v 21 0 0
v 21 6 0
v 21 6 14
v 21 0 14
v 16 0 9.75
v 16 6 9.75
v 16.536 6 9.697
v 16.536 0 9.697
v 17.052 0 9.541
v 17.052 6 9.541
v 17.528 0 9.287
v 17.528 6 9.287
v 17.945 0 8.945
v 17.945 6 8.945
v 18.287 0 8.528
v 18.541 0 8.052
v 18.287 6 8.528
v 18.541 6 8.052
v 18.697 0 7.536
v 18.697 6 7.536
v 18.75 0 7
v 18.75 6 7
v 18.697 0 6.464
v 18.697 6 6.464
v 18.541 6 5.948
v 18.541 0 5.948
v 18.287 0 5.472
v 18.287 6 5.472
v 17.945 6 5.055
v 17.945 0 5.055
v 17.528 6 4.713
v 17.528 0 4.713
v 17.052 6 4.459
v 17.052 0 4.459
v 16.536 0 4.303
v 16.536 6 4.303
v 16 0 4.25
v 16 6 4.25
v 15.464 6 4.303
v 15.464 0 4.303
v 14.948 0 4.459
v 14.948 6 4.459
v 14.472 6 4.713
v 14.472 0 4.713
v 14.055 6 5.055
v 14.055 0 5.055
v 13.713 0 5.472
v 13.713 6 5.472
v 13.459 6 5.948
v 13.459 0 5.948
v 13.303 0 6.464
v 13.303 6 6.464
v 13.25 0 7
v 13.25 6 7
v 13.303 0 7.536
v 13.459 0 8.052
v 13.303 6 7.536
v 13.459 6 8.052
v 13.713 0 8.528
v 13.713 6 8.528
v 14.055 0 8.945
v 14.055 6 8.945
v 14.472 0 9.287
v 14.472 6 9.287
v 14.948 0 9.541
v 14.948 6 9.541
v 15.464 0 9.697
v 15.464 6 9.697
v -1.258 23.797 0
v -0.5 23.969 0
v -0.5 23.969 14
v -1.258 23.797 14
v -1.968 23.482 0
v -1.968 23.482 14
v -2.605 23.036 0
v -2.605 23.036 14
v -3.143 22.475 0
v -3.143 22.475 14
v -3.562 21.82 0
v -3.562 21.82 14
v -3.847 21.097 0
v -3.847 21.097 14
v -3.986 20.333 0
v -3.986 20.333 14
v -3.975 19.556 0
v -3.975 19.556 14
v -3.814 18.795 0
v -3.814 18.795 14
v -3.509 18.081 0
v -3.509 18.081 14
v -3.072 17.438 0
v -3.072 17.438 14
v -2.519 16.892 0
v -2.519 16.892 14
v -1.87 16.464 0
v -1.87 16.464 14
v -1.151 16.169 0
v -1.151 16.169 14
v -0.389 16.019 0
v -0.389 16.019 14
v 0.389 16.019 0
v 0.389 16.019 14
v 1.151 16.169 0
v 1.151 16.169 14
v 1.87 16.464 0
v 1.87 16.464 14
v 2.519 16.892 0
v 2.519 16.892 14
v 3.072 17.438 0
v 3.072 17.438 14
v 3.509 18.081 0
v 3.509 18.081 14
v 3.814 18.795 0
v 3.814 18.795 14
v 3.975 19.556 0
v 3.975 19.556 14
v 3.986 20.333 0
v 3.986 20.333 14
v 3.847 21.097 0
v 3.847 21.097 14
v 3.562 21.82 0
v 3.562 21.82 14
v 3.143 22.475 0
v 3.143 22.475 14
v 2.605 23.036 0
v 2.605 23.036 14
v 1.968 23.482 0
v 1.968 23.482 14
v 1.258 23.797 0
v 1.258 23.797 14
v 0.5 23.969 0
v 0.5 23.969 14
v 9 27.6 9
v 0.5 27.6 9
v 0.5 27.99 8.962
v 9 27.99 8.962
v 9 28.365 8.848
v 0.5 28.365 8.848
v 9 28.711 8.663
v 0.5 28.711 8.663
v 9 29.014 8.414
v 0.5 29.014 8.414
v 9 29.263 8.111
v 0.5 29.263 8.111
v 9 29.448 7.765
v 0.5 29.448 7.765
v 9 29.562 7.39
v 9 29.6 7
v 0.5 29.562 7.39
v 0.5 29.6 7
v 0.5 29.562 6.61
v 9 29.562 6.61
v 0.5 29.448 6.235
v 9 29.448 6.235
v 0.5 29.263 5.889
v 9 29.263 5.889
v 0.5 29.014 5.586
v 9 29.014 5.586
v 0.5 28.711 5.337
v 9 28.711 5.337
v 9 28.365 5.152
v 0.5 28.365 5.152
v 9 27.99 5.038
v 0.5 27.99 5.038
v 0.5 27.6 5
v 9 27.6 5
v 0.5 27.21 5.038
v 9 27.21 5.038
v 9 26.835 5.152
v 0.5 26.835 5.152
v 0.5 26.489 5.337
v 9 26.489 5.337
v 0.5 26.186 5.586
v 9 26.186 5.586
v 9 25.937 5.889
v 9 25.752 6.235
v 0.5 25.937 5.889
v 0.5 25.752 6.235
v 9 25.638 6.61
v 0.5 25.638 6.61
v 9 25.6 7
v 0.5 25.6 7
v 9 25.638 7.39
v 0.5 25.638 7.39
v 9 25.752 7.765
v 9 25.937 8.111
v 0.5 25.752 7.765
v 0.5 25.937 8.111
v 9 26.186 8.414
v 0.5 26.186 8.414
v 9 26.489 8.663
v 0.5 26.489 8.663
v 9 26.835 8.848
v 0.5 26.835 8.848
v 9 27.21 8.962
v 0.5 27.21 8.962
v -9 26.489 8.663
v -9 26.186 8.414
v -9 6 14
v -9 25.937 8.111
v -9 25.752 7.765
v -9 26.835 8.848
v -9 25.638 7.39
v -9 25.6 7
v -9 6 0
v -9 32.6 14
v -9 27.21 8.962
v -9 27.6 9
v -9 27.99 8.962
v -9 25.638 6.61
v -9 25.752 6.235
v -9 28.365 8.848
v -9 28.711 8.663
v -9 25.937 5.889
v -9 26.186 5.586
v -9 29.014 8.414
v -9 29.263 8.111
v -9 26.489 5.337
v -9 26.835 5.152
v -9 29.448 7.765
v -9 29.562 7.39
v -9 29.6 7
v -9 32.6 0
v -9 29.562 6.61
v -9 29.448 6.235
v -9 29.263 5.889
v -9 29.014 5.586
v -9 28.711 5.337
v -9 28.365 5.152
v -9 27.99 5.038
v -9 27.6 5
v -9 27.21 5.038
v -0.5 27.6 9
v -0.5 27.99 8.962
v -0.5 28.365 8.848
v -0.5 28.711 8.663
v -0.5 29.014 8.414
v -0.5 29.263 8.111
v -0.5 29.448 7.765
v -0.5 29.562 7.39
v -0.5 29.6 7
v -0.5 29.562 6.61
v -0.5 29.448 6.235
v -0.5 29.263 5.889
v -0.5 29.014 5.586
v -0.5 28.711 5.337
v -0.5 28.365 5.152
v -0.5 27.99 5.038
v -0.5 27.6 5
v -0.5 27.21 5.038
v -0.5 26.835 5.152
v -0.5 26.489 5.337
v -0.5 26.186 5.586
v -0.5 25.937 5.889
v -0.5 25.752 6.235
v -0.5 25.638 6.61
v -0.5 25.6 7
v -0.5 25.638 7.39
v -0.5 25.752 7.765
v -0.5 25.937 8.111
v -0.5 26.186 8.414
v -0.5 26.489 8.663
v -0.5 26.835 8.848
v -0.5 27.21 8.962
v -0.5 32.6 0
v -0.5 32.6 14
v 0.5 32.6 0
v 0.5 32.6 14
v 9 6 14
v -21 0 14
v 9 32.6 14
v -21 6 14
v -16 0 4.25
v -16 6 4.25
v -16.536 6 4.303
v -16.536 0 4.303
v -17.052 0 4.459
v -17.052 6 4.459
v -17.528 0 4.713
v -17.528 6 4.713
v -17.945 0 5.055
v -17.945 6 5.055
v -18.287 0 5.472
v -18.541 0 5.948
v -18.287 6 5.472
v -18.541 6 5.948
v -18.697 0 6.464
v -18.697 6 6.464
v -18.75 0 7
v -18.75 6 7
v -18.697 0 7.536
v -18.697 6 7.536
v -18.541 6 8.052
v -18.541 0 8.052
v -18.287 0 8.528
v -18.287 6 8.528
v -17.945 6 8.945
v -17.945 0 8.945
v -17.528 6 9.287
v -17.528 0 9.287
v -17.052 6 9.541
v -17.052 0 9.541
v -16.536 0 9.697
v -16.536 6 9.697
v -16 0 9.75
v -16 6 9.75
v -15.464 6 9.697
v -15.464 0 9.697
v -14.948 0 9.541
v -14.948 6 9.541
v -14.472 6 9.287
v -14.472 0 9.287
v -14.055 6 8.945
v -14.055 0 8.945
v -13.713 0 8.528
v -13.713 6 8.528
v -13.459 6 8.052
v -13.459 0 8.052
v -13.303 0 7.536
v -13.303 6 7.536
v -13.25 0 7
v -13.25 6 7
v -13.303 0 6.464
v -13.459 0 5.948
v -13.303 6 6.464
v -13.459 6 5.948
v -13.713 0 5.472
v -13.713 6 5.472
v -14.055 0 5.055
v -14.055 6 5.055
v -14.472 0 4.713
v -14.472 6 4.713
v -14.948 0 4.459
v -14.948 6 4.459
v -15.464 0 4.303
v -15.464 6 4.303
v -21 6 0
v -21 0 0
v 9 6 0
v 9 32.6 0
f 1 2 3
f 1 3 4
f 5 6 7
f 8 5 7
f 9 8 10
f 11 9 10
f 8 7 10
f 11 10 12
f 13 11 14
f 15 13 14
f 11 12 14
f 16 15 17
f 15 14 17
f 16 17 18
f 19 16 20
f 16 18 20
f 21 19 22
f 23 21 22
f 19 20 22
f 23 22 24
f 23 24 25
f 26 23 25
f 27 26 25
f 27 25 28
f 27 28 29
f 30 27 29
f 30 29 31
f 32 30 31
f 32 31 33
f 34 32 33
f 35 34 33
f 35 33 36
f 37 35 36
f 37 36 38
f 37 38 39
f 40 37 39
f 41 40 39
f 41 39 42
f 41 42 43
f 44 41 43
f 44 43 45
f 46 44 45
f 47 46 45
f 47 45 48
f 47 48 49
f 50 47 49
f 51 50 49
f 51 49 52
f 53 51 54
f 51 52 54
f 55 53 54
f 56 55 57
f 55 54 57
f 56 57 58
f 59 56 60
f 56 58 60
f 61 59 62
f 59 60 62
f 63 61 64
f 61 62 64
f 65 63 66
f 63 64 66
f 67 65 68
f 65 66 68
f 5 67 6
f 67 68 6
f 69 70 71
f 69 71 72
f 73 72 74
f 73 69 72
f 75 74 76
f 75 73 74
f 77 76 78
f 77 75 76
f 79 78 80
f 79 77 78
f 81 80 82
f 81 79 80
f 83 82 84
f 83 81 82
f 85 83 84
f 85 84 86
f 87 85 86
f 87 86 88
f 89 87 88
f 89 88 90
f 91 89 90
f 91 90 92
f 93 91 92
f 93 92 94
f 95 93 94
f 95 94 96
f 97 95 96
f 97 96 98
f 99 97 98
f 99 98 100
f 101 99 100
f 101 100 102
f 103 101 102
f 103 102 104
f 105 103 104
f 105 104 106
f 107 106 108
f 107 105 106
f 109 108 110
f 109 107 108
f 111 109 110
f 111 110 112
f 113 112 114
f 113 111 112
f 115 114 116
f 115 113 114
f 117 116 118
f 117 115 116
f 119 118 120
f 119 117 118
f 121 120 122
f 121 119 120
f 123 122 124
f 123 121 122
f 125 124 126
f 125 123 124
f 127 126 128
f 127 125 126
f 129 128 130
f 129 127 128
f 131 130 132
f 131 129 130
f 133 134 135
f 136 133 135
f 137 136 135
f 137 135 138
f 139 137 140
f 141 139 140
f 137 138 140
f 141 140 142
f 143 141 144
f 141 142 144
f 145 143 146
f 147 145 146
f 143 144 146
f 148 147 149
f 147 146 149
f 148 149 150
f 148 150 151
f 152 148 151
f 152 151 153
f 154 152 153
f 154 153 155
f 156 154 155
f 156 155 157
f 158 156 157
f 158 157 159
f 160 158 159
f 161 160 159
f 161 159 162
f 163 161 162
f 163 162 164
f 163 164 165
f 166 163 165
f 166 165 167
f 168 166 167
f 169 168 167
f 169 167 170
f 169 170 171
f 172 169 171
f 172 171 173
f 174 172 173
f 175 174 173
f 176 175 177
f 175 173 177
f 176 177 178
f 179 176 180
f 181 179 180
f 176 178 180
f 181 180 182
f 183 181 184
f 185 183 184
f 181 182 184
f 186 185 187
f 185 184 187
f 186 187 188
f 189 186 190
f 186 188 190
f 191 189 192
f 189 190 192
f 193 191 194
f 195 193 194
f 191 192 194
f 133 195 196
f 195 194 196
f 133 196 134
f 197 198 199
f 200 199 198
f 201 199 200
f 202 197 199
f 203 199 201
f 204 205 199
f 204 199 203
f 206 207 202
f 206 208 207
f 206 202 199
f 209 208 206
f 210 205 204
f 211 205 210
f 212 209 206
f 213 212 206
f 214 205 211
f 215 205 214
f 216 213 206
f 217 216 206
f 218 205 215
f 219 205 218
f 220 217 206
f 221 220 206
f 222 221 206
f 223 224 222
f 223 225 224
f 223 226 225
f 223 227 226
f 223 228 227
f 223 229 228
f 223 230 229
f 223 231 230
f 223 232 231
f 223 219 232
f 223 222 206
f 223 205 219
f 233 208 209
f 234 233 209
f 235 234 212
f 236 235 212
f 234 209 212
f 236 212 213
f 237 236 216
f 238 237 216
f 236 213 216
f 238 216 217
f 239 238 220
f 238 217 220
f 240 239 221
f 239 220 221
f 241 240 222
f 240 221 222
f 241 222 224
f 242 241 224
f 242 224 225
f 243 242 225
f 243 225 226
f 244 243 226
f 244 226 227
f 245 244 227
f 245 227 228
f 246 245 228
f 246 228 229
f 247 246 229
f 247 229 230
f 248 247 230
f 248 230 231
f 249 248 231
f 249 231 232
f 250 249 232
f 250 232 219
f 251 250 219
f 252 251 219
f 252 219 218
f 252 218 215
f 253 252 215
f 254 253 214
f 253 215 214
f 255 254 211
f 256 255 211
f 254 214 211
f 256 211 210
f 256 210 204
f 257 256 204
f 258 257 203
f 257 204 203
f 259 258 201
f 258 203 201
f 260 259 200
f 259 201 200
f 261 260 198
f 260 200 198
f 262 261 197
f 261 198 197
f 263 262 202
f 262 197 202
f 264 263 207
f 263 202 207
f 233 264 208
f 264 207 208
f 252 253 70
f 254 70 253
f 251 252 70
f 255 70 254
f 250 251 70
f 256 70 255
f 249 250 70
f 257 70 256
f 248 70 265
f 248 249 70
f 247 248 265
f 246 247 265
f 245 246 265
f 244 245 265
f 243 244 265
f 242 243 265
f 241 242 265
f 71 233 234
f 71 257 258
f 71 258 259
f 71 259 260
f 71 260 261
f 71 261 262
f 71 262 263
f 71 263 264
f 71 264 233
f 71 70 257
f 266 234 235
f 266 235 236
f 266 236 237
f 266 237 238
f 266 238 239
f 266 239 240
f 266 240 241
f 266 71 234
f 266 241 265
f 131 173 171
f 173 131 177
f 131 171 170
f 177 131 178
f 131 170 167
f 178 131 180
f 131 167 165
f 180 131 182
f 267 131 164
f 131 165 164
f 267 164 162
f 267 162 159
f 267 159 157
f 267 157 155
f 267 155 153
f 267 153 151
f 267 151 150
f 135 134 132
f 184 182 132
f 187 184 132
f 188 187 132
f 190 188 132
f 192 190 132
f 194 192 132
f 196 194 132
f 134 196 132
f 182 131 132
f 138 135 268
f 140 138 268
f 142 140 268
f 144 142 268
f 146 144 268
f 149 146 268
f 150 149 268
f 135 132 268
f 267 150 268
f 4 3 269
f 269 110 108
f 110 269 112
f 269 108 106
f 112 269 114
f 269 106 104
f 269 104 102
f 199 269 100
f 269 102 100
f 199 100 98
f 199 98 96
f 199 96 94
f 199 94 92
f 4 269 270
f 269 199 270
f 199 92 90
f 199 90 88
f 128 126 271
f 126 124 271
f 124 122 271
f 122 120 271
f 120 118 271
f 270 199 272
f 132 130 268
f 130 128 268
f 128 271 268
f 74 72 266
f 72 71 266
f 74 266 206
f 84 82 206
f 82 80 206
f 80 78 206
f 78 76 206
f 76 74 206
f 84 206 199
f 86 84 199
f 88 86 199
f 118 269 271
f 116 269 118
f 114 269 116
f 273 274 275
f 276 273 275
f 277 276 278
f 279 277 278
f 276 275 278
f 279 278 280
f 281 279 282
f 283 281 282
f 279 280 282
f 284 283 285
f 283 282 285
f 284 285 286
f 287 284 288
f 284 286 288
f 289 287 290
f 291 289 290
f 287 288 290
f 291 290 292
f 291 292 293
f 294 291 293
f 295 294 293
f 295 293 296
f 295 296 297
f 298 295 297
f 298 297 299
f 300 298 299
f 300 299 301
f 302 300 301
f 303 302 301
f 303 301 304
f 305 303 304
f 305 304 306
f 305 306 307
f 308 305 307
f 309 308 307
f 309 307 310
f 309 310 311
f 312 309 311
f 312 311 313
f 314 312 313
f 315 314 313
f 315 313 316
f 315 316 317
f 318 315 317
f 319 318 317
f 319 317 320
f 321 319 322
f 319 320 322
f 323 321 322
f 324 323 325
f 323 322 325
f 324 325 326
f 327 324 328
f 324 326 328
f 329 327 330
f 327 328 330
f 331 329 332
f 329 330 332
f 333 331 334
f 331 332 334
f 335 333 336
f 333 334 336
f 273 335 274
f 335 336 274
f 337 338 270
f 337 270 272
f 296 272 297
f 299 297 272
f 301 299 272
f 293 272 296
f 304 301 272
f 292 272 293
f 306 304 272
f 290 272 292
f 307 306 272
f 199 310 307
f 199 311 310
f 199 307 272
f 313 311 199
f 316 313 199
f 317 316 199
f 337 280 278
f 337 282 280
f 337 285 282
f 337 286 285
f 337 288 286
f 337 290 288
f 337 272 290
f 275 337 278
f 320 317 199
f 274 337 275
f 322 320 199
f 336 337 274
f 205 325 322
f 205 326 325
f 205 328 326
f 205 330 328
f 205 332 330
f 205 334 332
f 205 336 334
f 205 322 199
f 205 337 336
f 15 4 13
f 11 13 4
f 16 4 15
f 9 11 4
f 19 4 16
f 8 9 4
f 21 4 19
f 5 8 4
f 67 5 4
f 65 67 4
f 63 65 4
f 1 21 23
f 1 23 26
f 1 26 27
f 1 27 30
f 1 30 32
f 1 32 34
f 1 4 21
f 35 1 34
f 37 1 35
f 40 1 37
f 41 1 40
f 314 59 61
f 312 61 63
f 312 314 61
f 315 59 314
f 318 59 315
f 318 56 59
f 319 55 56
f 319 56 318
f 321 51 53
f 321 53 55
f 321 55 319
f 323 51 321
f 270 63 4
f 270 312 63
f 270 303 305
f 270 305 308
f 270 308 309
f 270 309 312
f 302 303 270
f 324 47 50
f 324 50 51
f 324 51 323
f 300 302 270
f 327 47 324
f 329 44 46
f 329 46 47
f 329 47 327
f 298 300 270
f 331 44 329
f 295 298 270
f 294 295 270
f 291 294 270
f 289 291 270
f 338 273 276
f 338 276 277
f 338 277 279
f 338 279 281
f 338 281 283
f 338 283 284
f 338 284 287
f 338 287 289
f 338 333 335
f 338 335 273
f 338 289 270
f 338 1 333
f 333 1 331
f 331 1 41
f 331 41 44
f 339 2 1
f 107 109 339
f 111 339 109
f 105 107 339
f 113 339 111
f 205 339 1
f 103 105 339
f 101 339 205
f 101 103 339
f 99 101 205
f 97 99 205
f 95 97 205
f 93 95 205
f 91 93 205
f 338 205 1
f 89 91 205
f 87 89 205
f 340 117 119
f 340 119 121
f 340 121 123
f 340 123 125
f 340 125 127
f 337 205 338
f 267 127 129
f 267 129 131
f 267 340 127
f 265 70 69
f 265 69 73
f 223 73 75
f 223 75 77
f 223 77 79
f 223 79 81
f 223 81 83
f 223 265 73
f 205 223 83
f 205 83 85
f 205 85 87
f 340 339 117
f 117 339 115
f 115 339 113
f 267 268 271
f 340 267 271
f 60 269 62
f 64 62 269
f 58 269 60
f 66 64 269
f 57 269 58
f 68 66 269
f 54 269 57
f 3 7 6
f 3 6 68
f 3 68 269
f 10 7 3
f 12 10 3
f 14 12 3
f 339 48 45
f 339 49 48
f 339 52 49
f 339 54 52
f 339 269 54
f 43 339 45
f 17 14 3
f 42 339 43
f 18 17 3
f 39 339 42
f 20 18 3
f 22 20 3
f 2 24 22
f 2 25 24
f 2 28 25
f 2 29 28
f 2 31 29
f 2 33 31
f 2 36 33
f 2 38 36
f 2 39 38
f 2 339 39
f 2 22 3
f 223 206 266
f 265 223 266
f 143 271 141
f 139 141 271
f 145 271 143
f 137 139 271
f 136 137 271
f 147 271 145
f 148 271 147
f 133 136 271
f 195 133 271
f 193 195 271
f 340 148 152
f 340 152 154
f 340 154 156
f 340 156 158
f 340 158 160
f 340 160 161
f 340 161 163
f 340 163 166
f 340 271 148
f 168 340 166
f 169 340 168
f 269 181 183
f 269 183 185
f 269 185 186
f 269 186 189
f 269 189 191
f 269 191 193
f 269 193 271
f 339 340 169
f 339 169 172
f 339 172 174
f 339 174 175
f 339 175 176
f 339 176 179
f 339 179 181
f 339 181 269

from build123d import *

# Parameters (mm, degrees)
SKETCH_1_R          = 4
EXTRUDE_1_DEPTH     = 14
SKETCH_2_R          = 2.75
CUT_EXTRUDE_1_DEPTH = 37.66824239
SKETCH_3_R          = 2
CUT_EXTRUDE_2_DEPTH = 47.462457963
CUT_EXTRUDE_3_REACH = 43.228
SKETCH_4_W          = 1
SKETCH_4_H          = 8.631373033


with BuildPart() as part:
    # 草图1 → 凸台-拉伸1 (new body)
    with BuildSketch(Plane.XY):
        Polygon((21, 0), (-21, 0), (-21, 6), (-9, 6), (-9, 32.6), (9, 32.6), (9, 6), (21, 6), align=None)
        with Locations((0, 20)):
            Circle(SKETCH_1_R, mode=Mode.SUBTRACT)
    extrude(amount=EXTRUDE_1_DEPTH)

    # 草图2 → 切除-拉伸1 (cut, through all)
    with BuildSketch(Plane(origin=(0, 6, 0), x_dir=(1, 0, 0), z_dir=(0, 1, 0))):
        with Locations(Location((16, -7, 0), (0, 0, 270))):
            Circle(SKETCH_2_R)
        with Locations(Location((-16, -7, 0), (0, 0, 90))):
            Circle(SKETCH_2_R)
    extrude(amount=-CUT_EXTRUDE_1_DEPTH, mode=Mode.SUBTRACT)

    # 草图3 → 切除-拉伸2 (cut, through all)
    with BuildSketch(Plane.ZY.offset(9)):
        with Locations((7, 27.6)):
            Circle(SKETCH_3_R)
    extrude(amount=-CUT_EXTRUDE_2_DEPTH, mode=Mode.SUBTRACT)

    # 草图4 → 切除-拉伸3 (cut, up to next)
    with BuildSketch(Plane.XY.offset(14), mode=Mode.PRIVATE) as cut_extrude_3_sk1:
        with Locations((0, 28.284313484)):
            Rectangle(SKETCH_4_W, SKETCH_4_H)
    cut_extrude_3_tool1 = extrude(cut_extrude_3_sk1.sketch, amount=-CUT_EXTRUDE_3_REACH, mode=Mode.PRIVATE) & part.part
    add(cut_extrude_3_tool1.solids().sort_by_distance((0, 28.284313, 14))[0], mode=Mode.SUBTRACT)


solid = part.part
